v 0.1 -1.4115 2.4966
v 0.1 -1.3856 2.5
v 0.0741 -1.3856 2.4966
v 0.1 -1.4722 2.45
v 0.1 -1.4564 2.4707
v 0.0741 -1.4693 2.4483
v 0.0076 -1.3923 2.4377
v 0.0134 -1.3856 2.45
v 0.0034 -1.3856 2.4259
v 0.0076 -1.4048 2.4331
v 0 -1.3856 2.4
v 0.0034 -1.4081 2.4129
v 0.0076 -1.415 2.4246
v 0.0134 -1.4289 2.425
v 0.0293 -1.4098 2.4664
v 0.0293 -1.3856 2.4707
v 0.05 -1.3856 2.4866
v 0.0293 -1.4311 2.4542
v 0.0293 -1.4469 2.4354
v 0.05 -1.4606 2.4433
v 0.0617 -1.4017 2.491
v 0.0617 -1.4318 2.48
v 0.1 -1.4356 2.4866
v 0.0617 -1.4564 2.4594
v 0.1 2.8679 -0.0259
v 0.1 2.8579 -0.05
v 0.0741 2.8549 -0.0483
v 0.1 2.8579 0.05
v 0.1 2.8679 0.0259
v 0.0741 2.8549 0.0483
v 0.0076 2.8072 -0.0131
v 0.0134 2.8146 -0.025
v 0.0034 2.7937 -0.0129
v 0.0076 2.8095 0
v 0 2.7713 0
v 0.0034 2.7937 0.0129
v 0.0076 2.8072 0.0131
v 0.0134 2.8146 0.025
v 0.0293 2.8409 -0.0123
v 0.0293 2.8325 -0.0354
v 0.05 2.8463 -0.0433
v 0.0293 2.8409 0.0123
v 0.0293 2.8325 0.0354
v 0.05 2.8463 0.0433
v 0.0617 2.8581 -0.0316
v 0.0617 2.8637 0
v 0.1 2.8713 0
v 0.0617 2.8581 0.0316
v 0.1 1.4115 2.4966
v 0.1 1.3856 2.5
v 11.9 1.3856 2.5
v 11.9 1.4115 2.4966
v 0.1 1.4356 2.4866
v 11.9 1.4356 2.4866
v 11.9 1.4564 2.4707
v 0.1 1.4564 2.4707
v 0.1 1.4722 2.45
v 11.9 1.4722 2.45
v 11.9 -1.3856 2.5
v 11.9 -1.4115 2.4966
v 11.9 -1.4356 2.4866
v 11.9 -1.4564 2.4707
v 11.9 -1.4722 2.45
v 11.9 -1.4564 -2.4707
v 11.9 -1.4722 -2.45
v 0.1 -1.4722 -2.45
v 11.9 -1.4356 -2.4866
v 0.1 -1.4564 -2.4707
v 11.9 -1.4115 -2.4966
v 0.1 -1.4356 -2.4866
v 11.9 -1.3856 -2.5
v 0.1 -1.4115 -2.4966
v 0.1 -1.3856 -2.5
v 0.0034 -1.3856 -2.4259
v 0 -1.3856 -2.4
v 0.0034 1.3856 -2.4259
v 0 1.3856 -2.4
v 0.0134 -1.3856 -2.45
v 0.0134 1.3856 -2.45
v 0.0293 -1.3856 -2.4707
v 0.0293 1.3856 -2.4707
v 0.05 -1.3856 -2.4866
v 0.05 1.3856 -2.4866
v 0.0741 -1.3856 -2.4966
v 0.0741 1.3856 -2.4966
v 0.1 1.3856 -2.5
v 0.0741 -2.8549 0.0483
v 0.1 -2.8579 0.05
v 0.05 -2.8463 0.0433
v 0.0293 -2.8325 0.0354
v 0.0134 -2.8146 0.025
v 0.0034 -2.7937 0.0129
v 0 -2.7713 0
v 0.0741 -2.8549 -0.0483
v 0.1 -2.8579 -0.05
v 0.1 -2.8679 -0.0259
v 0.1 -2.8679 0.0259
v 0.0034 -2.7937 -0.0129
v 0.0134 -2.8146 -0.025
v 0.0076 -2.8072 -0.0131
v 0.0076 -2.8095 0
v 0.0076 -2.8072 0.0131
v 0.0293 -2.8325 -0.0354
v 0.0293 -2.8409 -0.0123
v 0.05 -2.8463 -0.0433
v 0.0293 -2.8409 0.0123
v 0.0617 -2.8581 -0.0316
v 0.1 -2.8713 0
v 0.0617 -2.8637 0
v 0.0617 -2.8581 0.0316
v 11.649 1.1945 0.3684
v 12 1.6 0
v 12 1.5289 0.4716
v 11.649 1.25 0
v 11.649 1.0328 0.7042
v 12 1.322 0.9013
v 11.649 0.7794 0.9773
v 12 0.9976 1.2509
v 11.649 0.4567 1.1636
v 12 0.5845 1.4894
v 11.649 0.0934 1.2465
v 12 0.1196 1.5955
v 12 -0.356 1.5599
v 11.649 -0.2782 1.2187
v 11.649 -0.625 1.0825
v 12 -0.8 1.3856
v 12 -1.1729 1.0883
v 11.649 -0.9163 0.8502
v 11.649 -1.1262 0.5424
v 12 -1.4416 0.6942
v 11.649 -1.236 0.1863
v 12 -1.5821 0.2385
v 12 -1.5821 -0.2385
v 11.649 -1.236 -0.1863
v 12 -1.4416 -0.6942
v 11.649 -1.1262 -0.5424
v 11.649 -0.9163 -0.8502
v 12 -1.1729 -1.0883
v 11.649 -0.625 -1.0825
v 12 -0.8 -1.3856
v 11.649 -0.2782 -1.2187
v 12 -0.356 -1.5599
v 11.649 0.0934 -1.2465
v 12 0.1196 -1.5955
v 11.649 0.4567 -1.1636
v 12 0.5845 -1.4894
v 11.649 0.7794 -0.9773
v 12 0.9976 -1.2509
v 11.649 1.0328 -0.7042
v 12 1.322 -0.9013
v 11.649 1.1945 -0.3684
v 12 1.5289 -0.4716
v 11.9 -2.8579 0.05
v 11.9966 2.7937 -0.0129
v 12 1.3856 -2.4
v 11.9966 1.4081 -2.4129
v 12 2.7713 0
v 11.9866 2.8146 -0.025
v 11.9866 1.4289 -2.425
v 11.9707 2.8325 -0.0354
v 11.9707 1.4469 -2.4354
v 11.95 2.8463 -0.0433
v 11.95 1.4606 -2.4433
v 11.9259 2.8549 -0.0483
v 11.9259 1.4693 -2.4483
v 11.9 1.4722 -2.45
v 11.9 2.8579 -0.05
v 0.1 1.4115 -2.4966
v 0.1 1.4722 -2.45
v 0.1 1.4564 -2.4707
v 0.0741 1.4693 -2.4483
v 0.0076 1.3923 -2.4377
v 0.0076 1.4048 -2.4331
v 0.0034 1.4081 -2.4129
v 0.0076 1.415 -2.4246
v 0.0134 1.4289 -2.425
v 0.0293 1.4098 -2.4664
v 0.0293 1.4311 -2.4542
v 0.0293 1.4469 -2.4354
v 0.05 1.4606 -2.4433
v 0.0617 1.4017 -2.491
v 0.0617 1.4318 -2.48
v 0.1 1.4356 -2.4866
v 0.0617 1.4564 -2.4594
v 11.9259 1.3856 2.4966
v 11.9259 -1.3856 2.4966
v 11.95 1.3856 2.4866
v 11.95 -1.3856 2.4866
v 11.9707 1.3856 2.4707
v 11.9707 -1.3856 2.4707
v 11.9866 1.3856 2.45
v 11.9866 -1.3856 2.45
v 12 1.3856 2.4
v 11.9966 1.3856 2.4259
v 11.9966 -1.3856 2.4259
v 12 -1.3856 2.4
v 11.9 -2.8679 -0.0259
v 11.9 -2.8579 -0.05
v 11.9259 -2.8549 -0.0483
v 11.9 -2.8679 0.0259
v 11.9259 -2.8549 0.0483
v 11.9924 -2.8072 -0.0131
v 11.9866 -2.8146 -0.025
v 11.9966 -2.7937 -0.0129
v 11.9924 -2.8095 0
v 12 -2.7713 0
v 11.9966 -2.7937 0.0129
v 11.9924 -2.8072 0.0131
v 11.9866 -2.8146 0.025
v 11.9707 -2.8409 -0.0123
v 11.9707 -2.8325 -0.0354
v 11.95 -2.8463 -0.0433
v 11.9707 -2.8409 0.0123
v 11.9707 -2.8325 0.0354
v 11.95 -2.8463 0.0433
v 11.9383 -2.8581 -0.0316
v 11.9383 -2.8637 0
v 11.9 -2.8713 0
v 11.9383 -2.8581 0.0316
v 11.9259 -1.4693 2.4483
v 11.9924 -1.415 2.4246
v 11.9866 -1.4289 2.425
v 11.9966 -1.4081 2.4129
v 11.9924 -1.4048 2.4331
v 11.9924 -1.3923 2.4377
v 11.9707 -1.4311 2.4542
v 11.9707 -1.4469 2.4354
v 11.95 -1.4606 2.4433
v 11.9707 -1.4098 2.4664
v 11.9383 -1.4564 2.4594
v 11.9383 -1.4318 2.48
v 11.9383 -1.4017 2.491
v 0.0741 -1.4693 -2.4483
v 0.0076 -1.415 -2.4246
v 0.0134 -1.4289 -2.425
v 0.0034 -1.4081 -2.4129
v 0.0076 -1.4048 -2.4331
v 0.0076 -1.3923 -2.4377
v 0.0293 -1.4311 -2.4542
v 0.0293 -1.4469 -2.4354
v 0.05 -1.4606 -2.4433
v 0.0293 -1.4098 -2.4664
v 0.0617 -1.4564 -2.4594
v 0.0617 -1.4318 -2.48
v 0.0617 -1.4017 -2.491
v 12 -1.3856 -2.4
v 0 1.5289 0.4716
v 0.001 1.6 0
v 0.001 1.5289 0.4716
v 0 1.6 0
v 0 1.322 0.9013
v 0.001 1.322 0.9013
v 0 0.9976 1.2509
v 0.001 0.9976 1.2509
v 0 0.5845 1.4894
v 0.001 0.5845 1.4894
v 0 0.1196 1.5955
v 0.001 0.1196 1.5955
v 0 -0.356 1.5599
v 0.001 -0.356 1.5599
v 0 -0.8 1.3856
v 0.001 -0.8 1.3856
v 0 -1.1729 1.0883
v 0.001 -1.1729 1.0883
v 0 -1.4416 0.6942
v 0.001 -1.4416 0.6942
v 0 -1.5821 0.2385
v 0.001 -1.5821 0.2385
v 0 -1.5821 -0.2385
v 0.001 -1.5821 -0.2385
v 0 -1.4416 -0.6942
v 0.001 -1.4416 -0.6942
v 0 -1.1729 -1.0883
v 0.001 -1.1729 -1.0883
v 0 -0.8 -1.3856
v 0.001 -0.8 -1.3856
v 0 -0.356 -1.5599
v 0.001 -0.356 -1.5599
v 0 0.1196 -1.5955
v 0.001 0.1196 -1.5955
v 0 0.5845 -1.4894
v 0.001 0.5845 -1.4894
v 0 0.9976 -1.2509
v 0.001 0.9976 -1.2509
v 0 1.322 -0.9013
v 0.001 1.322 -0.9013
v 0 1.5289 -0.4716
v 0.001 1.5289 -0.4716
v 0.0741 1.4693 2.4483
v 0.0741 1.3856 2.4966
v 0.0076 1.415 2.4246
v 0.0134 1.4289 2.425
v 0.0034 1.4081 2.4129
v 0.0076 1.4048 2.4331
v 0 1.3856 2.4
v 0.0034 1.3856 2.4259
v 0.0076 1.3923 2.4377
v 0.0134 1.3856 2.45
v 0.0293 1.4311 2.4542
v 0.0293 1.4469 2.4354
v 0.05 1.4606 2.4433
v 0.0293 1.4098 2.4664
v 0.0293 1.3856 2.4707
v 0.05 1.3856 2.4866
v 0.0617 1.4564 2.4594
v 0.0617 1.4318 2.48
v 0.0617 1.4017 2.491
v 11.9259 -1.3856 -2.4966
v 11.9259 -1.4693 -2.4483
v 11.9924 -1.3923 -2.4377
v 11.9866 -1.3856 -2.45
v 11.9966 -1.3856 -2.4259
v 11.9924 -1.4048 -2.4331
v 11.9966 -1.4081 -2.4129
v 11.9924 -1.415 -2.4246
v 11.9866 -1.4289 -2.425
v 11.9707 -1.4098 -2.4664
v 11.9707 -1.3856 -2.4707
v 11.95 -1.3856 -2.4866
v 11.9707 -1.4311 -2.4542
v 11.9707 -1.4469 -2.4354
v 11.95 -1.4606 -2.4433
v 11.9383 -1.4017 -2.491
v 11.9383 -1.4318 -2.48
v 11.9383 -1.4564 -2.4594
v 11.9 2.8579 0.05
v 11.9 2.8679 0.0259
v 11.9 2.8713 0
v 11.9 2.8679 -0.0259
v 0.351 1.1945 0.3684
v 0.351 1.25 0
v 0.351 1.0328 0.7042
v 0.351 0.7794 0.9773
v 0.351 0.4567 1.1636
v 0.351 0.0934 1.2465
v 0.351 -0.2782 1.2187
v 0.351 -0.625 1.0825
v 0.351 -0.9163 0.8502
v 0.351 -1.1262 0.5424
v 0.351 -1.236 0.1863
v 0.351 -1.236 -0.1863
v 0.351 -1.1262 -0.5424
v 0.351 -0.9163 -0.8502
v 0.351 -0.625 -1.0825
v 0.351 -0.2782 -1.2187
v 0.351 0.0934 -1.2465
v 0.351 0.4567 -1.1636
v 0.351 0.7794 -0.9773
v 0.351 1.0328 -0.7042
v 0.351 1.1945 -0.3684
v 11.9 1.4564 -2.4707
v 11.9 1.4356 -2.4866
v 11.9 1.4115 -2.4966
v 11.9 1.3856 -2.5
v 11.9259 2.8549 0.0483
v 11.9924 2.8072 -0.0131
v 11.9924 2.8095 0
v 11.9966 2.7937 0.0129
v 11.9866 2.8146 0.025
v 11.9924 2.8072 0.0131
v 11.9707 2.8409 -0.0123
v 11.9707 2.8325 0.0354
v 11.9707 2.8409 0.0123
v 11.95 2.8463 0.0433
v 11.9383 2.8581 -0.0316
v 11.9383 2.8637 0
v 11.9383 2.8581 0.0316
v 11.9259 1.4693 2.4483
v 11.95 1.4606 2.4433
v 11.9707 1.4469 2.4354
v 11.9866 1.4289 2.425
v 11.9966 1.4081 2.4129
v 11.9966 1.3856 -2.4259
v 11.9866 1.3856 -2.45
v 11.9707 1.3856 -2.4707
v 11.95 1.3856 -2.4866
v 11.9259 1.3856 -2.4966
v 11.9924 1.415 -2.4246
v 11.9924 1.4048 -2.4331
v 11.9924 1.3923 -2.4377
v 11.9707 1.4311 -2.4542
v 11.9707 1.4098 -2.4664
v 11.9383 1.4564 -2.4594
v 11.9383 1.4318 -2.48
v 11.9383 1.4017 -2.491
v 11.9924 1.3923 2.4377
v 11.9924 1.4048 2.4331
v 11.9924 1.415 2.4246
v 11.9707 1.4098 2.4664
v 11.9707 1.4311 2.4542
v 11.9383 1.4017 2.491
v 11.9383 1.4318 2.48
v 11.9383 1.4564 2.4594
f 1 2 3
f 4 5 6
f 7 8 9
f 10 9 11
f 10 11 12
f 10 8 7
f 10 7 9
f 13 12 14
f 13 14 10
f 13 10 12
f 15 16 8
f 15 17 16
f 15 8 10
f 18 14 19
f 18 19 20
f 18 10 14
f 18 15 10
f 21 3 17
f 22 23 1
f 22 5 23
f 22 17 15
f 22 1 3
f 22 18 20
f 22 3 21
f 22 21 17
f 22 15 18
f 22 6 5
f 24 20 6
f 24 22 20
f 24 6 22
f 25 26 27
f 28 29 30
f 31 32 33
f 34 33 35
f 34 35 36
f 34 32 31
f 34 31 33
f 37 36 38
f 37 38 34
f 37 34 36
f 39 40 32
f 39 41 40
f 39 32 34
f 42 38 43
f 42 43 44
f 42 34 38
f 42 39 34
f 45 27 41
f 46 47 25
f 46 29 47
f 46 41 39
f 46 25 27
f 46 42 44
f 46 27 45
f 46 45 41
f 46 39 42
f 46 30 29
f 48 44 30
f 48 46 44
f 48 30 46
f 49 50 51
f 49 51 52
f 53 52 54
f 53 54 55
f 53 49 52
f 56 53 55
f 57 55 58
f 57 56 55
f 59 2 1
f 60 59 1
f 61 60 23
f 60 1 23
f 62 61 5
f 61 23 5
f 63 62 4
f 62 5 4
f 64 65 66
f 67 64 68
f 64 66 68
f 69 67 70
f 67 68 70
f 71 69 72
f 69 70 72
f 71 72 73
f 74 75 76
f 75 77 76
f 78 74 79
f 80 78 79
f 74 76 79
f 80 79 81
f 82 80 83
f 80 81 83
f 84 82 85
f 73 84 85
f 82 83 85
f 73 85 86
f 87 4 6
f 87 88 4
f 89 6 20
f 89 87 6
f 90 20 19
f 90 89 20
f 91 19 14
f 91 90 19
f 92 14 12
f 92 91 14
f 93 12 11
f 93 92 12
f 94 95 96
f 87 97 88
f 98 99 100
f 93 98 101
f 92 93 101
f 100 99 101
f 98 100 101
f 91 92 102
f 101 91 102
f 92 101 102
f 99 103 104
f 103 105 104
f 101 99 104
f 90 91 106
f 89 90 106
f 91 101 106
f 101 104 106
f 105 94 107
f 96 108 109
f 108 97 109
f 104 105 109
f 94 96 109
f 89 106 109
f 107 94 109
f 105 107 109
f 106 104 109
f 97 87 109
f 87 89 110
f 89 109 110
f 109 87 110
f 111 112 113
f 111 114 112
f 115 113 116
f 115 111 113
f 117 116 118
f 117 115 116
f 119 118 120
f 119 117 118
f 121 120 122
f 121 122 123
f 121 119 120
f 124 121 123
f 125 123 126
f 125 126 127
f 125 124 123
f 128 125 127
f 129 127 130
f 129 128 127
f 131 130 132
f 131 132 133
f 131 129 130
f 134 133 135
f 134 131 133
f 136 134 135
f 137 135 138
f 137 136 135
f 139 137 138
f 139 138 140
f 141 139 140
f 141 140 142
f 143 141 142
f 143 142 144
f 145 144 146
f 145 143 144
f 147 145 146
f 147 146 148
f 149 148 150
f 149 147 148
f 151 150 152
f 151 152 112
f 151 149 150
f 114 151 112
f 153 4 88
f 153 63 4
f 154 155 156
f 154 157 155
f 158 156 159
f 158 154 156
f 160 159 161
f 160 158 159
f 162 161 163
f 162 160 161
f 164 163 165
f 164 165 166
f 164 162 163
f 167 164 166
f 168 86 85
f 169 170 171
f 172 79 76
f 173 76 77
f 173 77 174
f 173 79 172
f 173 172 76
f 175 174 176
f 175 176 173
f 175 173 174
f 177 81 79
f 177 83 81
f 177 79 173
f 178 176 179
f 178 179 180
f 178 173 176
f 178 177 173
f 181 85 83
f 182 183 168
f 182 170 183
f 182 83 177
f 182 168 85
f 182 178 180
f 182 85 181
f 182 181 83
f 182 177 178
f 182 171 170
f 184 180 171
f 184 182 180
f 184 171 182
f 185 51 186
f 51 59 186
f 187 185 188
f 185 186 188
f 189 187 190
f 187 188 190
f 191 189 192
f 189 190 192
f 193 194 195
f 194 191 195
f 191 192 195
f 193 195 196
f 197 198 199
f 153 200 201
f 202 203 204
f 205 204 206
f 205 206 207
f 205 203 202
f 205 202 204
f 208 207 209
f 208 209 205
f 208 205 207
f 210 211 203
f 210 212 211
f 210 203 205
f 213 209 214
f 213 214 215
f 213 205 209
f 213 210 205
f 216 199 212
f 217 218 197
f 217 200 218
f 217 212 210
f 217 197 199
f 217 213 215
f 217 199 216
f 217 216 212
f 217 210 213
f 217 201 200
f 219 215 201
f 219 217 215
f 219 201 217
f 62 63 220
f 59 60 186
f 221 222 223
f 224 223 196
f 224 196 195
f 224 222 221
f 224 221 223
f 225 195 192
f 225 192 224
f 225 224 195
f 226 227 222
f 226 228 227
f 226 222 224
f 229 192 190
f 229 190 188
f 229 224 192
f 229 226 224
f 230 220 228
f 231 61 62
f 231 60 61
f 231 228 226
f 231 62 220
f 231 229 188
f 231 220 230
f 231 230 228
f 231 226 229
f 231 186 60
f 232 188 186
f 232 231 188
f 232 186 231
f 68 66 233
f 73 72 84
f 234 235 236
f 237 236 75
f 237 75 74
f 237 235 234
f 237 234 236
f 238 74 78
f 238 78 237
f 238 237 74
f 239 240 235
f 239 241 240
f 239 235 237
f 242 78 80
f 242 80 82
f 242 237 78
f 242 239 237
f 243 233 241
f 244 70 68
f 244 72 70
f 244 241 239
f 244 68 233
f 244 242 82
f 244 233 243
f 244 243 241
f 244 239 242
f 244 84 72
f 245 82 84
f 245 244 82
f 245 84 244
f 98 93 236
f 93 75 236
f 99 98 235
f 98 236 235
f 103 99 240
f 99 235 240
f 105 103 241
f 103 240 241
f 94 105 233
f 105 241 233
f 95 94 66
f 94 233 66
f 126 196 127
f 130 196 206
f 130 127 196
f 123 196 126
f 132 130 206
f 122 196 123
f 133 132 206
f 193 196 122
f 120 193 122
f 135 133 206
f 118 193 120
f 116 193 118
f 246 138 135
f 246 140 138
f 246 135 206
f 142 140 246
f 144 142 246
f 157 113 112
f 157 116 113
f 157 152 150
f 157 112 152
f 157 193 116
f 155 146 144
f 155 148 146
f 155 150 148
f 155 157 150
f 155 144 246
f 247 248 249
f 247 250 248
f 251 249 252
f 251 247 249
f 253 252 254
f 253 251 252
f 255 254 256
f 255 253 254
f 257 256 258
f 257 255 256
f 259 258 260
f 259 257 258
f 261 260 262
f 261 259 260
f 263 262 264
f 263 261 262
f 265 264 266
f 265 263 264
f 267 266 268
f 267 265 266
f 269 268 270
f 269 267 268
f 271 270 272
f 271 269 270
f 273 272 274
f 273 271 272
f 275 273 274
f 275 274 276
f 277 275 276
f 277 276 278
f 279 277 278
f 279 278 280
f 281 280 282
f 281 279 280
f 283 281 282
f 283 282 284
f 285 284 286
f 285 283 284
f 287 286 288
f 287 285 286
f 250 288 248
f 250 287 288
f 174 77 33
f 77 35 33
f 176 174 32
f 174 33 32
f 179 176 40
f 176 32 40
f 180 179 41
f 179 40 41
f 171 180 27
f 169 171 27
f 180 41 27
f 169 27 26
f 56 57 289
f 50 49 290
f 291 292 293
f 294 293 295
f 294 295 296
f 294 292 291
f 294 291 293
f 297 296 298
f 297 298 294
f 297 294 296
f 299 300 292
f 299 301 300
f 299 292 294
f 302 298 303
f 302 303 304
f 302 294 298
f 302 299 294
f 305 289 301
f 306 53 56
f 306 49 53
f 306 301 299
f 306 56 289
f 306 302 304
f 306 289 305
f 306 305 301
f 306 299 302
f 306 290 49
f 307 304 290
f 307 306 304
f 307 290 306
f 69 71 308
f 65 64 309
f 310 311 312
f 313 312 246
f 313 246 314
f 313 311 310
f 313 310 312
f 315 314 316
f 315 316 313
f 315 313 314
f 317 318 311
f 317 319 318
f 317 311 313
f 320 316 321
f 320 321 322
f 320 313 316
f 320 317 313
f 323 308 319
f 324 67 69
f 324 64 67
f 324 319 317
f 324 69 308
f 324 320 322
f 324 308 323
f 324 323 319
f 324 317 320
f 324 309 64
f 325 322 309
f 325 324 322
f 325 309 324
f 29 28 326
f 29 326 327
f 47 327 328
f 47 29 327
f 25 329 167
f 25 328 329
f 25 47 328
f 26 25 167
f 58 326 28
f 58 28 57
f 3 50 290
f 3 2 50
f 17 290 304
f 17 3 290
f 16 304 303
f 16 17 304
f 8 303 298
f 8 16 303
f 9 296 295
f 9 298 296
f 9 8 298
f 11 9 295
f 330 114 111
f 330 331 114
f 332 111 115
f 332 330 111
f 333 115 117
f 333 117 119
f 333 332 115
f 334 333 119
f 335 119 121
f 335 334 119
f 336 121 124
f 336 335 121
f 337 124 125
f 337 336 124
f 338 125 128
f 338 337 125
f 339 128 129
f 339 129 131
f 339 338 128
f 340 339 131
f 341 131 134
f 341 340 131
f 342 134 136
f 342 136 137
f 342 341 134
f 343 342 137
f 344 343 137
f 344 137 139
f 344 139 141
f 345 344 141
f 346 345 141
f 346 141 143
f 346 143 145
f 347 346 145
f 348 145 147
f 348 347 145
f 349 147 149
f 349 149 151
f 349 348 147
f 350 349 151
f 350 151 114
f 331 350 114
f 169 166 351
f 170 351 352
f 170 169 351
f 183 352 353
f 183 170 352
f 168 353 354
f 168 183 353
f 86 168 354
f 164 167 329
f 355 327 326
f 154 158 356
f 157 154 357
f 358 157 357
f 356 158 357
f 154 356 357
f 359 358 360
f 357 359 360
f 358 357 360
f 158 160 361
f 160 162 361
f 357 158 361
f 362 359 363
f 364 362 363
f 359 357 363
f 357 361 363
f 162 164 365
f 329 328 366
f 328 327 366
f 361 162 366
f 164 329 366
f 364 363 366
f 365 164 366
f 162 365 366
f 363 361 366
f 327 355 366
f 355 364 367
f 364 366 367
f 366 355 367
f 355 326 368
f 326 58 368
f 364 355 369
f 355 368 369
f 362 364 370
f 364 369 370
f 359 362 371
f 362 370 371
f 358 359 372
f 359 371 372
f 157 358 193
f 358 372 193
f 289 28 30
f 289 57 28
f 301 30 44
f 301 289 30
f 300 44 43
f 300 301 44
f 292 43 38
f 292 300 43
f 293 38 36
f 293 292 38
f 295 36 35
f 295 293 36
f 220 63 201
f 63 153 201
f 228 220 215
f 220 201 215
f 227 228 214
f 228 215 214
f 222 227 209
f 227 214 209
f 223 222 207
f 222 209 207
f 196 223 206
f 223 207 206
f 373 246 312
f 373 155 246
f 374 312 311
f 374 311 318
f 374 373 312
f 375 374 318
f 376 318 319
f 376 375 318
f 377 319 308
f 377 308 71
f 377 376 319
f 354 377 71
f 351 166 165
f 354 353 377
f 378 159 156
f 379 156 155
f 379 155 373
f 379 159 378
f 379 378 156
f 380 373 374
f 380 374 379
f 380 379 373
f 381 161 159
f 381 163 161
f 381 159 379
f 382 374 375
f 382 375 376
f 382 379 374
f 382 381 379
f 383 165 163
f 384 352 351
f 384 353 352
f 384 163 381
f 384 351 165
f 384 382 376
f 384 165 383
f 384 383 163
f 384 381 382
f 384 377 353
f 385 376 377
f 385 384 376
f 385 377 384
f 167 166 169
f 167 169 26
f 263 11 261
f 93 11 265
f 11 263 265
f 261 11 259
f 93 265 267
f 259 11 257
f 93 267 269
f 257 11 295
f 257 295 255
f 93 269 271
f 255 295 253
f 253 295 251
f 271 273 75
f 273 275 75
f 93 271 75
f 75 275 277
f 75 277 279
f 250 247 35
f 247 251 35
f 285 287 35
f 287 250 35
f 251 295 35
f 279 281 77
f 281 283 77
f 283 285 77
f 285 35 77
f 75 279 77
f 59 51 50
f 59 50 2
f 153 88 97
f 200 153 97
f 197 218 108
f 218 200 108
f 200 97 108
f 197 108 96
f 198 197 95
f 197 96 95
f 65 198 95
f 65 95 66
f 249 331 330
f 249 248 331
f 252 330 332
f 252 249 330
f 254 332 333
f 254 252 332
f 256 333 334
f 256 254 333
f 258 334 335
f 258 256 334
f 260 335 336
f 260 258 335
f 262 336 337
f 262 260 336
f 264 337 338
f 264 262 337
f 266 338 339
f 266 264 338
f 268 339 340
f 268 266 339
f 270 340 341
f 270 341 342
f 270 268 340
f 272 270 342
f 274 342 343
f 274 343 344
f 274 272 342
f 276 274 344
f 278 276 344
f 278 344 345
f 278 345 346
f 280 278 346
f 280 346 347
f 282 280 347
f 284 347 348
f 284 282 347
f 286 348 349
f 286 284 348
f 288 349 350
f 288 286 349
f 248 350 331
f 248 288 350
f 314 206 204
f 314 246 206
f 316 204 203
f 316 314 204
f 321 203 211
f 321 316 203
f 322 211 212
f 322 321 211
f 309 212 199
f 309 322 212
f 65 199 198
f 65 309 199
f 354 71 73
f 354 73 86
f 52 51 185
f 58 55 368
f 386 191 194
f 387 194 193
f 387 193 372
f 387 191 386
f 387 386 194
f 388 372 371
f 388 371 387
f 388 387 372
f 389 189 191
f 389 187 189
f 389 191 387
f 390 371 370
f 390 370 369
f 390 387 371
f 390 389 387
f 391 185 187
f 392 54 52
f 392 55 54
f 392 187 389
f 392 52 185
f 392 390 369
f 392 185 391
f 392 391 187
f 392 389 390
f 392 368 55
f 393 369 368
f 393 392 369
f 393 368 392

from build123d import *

# Parameters (mm, degrees)
BOSS_EXTRUDE1_DEPTH = 12
FILLET1_R           = 0.1


with BuildPart() as part:
    # Sketch1 → Boss-Extrude1 (new body)
    with BuildSketch(Plane(origin=(12, 0, 0), x_dir=(0, 0, -1), z_dir=(1, 0, 0))):
        Polygon((-2.5, 1.443375673), (-2.5, -1.443375673), (0, -2.886751346), (2.5, -1.443375673), (2.5, 1.443375673), (0, 2.886751346), align=None)
    extrude(amount=-BOSS_EXTRUDE1_DEPTH)

    # Sketch2 → Cut-Revolve1 (revolve, cut)
    with BuildSketch(Plane.XY):
        Polygon((0, 1.6), (0, 0), (12, 0), (12, 1.6), (11.649, 1.25), (0.351, 1.25), (0.001, 1.6), align=None)
    revolve(axis=Axis((0, 0, 0), (1, 0, 0)), mode=Mode.SUBTRACT)

    # Fillet1
    fillet1_edges = [part.edges().sort_by_distance(p)[0] for p in [
        (0, -2.165063509, 1.25),
        (6, 2.886751346, 0),
        (6, 1.443375673, -2.5),
        (6, -1.443375673, -2.5),
        (6, -2.886751346, 0),
        (6, -1.443375673, 2.5),
        (6, 1.443375673, 2.5),
        (0, -2.165063509, -1.25),
        (0, 0, -2.5),
        (0, 2.165063509, -1.25),
        (0, 2.165063509, 1.25),
        (12, 2.165063509, -1.25),
        (12, 0, -2.5),
        (12, -2.165063509, -1.25),
        (0, 0, 2.5),
        (12, -2.165063509, 1.25),
        (12, 0, 2.5),
        (12, 2.165063509, 1.25),
    ]]
    fillet(fillet1_edges, radius=FILLET1_R)


solid = part.part
